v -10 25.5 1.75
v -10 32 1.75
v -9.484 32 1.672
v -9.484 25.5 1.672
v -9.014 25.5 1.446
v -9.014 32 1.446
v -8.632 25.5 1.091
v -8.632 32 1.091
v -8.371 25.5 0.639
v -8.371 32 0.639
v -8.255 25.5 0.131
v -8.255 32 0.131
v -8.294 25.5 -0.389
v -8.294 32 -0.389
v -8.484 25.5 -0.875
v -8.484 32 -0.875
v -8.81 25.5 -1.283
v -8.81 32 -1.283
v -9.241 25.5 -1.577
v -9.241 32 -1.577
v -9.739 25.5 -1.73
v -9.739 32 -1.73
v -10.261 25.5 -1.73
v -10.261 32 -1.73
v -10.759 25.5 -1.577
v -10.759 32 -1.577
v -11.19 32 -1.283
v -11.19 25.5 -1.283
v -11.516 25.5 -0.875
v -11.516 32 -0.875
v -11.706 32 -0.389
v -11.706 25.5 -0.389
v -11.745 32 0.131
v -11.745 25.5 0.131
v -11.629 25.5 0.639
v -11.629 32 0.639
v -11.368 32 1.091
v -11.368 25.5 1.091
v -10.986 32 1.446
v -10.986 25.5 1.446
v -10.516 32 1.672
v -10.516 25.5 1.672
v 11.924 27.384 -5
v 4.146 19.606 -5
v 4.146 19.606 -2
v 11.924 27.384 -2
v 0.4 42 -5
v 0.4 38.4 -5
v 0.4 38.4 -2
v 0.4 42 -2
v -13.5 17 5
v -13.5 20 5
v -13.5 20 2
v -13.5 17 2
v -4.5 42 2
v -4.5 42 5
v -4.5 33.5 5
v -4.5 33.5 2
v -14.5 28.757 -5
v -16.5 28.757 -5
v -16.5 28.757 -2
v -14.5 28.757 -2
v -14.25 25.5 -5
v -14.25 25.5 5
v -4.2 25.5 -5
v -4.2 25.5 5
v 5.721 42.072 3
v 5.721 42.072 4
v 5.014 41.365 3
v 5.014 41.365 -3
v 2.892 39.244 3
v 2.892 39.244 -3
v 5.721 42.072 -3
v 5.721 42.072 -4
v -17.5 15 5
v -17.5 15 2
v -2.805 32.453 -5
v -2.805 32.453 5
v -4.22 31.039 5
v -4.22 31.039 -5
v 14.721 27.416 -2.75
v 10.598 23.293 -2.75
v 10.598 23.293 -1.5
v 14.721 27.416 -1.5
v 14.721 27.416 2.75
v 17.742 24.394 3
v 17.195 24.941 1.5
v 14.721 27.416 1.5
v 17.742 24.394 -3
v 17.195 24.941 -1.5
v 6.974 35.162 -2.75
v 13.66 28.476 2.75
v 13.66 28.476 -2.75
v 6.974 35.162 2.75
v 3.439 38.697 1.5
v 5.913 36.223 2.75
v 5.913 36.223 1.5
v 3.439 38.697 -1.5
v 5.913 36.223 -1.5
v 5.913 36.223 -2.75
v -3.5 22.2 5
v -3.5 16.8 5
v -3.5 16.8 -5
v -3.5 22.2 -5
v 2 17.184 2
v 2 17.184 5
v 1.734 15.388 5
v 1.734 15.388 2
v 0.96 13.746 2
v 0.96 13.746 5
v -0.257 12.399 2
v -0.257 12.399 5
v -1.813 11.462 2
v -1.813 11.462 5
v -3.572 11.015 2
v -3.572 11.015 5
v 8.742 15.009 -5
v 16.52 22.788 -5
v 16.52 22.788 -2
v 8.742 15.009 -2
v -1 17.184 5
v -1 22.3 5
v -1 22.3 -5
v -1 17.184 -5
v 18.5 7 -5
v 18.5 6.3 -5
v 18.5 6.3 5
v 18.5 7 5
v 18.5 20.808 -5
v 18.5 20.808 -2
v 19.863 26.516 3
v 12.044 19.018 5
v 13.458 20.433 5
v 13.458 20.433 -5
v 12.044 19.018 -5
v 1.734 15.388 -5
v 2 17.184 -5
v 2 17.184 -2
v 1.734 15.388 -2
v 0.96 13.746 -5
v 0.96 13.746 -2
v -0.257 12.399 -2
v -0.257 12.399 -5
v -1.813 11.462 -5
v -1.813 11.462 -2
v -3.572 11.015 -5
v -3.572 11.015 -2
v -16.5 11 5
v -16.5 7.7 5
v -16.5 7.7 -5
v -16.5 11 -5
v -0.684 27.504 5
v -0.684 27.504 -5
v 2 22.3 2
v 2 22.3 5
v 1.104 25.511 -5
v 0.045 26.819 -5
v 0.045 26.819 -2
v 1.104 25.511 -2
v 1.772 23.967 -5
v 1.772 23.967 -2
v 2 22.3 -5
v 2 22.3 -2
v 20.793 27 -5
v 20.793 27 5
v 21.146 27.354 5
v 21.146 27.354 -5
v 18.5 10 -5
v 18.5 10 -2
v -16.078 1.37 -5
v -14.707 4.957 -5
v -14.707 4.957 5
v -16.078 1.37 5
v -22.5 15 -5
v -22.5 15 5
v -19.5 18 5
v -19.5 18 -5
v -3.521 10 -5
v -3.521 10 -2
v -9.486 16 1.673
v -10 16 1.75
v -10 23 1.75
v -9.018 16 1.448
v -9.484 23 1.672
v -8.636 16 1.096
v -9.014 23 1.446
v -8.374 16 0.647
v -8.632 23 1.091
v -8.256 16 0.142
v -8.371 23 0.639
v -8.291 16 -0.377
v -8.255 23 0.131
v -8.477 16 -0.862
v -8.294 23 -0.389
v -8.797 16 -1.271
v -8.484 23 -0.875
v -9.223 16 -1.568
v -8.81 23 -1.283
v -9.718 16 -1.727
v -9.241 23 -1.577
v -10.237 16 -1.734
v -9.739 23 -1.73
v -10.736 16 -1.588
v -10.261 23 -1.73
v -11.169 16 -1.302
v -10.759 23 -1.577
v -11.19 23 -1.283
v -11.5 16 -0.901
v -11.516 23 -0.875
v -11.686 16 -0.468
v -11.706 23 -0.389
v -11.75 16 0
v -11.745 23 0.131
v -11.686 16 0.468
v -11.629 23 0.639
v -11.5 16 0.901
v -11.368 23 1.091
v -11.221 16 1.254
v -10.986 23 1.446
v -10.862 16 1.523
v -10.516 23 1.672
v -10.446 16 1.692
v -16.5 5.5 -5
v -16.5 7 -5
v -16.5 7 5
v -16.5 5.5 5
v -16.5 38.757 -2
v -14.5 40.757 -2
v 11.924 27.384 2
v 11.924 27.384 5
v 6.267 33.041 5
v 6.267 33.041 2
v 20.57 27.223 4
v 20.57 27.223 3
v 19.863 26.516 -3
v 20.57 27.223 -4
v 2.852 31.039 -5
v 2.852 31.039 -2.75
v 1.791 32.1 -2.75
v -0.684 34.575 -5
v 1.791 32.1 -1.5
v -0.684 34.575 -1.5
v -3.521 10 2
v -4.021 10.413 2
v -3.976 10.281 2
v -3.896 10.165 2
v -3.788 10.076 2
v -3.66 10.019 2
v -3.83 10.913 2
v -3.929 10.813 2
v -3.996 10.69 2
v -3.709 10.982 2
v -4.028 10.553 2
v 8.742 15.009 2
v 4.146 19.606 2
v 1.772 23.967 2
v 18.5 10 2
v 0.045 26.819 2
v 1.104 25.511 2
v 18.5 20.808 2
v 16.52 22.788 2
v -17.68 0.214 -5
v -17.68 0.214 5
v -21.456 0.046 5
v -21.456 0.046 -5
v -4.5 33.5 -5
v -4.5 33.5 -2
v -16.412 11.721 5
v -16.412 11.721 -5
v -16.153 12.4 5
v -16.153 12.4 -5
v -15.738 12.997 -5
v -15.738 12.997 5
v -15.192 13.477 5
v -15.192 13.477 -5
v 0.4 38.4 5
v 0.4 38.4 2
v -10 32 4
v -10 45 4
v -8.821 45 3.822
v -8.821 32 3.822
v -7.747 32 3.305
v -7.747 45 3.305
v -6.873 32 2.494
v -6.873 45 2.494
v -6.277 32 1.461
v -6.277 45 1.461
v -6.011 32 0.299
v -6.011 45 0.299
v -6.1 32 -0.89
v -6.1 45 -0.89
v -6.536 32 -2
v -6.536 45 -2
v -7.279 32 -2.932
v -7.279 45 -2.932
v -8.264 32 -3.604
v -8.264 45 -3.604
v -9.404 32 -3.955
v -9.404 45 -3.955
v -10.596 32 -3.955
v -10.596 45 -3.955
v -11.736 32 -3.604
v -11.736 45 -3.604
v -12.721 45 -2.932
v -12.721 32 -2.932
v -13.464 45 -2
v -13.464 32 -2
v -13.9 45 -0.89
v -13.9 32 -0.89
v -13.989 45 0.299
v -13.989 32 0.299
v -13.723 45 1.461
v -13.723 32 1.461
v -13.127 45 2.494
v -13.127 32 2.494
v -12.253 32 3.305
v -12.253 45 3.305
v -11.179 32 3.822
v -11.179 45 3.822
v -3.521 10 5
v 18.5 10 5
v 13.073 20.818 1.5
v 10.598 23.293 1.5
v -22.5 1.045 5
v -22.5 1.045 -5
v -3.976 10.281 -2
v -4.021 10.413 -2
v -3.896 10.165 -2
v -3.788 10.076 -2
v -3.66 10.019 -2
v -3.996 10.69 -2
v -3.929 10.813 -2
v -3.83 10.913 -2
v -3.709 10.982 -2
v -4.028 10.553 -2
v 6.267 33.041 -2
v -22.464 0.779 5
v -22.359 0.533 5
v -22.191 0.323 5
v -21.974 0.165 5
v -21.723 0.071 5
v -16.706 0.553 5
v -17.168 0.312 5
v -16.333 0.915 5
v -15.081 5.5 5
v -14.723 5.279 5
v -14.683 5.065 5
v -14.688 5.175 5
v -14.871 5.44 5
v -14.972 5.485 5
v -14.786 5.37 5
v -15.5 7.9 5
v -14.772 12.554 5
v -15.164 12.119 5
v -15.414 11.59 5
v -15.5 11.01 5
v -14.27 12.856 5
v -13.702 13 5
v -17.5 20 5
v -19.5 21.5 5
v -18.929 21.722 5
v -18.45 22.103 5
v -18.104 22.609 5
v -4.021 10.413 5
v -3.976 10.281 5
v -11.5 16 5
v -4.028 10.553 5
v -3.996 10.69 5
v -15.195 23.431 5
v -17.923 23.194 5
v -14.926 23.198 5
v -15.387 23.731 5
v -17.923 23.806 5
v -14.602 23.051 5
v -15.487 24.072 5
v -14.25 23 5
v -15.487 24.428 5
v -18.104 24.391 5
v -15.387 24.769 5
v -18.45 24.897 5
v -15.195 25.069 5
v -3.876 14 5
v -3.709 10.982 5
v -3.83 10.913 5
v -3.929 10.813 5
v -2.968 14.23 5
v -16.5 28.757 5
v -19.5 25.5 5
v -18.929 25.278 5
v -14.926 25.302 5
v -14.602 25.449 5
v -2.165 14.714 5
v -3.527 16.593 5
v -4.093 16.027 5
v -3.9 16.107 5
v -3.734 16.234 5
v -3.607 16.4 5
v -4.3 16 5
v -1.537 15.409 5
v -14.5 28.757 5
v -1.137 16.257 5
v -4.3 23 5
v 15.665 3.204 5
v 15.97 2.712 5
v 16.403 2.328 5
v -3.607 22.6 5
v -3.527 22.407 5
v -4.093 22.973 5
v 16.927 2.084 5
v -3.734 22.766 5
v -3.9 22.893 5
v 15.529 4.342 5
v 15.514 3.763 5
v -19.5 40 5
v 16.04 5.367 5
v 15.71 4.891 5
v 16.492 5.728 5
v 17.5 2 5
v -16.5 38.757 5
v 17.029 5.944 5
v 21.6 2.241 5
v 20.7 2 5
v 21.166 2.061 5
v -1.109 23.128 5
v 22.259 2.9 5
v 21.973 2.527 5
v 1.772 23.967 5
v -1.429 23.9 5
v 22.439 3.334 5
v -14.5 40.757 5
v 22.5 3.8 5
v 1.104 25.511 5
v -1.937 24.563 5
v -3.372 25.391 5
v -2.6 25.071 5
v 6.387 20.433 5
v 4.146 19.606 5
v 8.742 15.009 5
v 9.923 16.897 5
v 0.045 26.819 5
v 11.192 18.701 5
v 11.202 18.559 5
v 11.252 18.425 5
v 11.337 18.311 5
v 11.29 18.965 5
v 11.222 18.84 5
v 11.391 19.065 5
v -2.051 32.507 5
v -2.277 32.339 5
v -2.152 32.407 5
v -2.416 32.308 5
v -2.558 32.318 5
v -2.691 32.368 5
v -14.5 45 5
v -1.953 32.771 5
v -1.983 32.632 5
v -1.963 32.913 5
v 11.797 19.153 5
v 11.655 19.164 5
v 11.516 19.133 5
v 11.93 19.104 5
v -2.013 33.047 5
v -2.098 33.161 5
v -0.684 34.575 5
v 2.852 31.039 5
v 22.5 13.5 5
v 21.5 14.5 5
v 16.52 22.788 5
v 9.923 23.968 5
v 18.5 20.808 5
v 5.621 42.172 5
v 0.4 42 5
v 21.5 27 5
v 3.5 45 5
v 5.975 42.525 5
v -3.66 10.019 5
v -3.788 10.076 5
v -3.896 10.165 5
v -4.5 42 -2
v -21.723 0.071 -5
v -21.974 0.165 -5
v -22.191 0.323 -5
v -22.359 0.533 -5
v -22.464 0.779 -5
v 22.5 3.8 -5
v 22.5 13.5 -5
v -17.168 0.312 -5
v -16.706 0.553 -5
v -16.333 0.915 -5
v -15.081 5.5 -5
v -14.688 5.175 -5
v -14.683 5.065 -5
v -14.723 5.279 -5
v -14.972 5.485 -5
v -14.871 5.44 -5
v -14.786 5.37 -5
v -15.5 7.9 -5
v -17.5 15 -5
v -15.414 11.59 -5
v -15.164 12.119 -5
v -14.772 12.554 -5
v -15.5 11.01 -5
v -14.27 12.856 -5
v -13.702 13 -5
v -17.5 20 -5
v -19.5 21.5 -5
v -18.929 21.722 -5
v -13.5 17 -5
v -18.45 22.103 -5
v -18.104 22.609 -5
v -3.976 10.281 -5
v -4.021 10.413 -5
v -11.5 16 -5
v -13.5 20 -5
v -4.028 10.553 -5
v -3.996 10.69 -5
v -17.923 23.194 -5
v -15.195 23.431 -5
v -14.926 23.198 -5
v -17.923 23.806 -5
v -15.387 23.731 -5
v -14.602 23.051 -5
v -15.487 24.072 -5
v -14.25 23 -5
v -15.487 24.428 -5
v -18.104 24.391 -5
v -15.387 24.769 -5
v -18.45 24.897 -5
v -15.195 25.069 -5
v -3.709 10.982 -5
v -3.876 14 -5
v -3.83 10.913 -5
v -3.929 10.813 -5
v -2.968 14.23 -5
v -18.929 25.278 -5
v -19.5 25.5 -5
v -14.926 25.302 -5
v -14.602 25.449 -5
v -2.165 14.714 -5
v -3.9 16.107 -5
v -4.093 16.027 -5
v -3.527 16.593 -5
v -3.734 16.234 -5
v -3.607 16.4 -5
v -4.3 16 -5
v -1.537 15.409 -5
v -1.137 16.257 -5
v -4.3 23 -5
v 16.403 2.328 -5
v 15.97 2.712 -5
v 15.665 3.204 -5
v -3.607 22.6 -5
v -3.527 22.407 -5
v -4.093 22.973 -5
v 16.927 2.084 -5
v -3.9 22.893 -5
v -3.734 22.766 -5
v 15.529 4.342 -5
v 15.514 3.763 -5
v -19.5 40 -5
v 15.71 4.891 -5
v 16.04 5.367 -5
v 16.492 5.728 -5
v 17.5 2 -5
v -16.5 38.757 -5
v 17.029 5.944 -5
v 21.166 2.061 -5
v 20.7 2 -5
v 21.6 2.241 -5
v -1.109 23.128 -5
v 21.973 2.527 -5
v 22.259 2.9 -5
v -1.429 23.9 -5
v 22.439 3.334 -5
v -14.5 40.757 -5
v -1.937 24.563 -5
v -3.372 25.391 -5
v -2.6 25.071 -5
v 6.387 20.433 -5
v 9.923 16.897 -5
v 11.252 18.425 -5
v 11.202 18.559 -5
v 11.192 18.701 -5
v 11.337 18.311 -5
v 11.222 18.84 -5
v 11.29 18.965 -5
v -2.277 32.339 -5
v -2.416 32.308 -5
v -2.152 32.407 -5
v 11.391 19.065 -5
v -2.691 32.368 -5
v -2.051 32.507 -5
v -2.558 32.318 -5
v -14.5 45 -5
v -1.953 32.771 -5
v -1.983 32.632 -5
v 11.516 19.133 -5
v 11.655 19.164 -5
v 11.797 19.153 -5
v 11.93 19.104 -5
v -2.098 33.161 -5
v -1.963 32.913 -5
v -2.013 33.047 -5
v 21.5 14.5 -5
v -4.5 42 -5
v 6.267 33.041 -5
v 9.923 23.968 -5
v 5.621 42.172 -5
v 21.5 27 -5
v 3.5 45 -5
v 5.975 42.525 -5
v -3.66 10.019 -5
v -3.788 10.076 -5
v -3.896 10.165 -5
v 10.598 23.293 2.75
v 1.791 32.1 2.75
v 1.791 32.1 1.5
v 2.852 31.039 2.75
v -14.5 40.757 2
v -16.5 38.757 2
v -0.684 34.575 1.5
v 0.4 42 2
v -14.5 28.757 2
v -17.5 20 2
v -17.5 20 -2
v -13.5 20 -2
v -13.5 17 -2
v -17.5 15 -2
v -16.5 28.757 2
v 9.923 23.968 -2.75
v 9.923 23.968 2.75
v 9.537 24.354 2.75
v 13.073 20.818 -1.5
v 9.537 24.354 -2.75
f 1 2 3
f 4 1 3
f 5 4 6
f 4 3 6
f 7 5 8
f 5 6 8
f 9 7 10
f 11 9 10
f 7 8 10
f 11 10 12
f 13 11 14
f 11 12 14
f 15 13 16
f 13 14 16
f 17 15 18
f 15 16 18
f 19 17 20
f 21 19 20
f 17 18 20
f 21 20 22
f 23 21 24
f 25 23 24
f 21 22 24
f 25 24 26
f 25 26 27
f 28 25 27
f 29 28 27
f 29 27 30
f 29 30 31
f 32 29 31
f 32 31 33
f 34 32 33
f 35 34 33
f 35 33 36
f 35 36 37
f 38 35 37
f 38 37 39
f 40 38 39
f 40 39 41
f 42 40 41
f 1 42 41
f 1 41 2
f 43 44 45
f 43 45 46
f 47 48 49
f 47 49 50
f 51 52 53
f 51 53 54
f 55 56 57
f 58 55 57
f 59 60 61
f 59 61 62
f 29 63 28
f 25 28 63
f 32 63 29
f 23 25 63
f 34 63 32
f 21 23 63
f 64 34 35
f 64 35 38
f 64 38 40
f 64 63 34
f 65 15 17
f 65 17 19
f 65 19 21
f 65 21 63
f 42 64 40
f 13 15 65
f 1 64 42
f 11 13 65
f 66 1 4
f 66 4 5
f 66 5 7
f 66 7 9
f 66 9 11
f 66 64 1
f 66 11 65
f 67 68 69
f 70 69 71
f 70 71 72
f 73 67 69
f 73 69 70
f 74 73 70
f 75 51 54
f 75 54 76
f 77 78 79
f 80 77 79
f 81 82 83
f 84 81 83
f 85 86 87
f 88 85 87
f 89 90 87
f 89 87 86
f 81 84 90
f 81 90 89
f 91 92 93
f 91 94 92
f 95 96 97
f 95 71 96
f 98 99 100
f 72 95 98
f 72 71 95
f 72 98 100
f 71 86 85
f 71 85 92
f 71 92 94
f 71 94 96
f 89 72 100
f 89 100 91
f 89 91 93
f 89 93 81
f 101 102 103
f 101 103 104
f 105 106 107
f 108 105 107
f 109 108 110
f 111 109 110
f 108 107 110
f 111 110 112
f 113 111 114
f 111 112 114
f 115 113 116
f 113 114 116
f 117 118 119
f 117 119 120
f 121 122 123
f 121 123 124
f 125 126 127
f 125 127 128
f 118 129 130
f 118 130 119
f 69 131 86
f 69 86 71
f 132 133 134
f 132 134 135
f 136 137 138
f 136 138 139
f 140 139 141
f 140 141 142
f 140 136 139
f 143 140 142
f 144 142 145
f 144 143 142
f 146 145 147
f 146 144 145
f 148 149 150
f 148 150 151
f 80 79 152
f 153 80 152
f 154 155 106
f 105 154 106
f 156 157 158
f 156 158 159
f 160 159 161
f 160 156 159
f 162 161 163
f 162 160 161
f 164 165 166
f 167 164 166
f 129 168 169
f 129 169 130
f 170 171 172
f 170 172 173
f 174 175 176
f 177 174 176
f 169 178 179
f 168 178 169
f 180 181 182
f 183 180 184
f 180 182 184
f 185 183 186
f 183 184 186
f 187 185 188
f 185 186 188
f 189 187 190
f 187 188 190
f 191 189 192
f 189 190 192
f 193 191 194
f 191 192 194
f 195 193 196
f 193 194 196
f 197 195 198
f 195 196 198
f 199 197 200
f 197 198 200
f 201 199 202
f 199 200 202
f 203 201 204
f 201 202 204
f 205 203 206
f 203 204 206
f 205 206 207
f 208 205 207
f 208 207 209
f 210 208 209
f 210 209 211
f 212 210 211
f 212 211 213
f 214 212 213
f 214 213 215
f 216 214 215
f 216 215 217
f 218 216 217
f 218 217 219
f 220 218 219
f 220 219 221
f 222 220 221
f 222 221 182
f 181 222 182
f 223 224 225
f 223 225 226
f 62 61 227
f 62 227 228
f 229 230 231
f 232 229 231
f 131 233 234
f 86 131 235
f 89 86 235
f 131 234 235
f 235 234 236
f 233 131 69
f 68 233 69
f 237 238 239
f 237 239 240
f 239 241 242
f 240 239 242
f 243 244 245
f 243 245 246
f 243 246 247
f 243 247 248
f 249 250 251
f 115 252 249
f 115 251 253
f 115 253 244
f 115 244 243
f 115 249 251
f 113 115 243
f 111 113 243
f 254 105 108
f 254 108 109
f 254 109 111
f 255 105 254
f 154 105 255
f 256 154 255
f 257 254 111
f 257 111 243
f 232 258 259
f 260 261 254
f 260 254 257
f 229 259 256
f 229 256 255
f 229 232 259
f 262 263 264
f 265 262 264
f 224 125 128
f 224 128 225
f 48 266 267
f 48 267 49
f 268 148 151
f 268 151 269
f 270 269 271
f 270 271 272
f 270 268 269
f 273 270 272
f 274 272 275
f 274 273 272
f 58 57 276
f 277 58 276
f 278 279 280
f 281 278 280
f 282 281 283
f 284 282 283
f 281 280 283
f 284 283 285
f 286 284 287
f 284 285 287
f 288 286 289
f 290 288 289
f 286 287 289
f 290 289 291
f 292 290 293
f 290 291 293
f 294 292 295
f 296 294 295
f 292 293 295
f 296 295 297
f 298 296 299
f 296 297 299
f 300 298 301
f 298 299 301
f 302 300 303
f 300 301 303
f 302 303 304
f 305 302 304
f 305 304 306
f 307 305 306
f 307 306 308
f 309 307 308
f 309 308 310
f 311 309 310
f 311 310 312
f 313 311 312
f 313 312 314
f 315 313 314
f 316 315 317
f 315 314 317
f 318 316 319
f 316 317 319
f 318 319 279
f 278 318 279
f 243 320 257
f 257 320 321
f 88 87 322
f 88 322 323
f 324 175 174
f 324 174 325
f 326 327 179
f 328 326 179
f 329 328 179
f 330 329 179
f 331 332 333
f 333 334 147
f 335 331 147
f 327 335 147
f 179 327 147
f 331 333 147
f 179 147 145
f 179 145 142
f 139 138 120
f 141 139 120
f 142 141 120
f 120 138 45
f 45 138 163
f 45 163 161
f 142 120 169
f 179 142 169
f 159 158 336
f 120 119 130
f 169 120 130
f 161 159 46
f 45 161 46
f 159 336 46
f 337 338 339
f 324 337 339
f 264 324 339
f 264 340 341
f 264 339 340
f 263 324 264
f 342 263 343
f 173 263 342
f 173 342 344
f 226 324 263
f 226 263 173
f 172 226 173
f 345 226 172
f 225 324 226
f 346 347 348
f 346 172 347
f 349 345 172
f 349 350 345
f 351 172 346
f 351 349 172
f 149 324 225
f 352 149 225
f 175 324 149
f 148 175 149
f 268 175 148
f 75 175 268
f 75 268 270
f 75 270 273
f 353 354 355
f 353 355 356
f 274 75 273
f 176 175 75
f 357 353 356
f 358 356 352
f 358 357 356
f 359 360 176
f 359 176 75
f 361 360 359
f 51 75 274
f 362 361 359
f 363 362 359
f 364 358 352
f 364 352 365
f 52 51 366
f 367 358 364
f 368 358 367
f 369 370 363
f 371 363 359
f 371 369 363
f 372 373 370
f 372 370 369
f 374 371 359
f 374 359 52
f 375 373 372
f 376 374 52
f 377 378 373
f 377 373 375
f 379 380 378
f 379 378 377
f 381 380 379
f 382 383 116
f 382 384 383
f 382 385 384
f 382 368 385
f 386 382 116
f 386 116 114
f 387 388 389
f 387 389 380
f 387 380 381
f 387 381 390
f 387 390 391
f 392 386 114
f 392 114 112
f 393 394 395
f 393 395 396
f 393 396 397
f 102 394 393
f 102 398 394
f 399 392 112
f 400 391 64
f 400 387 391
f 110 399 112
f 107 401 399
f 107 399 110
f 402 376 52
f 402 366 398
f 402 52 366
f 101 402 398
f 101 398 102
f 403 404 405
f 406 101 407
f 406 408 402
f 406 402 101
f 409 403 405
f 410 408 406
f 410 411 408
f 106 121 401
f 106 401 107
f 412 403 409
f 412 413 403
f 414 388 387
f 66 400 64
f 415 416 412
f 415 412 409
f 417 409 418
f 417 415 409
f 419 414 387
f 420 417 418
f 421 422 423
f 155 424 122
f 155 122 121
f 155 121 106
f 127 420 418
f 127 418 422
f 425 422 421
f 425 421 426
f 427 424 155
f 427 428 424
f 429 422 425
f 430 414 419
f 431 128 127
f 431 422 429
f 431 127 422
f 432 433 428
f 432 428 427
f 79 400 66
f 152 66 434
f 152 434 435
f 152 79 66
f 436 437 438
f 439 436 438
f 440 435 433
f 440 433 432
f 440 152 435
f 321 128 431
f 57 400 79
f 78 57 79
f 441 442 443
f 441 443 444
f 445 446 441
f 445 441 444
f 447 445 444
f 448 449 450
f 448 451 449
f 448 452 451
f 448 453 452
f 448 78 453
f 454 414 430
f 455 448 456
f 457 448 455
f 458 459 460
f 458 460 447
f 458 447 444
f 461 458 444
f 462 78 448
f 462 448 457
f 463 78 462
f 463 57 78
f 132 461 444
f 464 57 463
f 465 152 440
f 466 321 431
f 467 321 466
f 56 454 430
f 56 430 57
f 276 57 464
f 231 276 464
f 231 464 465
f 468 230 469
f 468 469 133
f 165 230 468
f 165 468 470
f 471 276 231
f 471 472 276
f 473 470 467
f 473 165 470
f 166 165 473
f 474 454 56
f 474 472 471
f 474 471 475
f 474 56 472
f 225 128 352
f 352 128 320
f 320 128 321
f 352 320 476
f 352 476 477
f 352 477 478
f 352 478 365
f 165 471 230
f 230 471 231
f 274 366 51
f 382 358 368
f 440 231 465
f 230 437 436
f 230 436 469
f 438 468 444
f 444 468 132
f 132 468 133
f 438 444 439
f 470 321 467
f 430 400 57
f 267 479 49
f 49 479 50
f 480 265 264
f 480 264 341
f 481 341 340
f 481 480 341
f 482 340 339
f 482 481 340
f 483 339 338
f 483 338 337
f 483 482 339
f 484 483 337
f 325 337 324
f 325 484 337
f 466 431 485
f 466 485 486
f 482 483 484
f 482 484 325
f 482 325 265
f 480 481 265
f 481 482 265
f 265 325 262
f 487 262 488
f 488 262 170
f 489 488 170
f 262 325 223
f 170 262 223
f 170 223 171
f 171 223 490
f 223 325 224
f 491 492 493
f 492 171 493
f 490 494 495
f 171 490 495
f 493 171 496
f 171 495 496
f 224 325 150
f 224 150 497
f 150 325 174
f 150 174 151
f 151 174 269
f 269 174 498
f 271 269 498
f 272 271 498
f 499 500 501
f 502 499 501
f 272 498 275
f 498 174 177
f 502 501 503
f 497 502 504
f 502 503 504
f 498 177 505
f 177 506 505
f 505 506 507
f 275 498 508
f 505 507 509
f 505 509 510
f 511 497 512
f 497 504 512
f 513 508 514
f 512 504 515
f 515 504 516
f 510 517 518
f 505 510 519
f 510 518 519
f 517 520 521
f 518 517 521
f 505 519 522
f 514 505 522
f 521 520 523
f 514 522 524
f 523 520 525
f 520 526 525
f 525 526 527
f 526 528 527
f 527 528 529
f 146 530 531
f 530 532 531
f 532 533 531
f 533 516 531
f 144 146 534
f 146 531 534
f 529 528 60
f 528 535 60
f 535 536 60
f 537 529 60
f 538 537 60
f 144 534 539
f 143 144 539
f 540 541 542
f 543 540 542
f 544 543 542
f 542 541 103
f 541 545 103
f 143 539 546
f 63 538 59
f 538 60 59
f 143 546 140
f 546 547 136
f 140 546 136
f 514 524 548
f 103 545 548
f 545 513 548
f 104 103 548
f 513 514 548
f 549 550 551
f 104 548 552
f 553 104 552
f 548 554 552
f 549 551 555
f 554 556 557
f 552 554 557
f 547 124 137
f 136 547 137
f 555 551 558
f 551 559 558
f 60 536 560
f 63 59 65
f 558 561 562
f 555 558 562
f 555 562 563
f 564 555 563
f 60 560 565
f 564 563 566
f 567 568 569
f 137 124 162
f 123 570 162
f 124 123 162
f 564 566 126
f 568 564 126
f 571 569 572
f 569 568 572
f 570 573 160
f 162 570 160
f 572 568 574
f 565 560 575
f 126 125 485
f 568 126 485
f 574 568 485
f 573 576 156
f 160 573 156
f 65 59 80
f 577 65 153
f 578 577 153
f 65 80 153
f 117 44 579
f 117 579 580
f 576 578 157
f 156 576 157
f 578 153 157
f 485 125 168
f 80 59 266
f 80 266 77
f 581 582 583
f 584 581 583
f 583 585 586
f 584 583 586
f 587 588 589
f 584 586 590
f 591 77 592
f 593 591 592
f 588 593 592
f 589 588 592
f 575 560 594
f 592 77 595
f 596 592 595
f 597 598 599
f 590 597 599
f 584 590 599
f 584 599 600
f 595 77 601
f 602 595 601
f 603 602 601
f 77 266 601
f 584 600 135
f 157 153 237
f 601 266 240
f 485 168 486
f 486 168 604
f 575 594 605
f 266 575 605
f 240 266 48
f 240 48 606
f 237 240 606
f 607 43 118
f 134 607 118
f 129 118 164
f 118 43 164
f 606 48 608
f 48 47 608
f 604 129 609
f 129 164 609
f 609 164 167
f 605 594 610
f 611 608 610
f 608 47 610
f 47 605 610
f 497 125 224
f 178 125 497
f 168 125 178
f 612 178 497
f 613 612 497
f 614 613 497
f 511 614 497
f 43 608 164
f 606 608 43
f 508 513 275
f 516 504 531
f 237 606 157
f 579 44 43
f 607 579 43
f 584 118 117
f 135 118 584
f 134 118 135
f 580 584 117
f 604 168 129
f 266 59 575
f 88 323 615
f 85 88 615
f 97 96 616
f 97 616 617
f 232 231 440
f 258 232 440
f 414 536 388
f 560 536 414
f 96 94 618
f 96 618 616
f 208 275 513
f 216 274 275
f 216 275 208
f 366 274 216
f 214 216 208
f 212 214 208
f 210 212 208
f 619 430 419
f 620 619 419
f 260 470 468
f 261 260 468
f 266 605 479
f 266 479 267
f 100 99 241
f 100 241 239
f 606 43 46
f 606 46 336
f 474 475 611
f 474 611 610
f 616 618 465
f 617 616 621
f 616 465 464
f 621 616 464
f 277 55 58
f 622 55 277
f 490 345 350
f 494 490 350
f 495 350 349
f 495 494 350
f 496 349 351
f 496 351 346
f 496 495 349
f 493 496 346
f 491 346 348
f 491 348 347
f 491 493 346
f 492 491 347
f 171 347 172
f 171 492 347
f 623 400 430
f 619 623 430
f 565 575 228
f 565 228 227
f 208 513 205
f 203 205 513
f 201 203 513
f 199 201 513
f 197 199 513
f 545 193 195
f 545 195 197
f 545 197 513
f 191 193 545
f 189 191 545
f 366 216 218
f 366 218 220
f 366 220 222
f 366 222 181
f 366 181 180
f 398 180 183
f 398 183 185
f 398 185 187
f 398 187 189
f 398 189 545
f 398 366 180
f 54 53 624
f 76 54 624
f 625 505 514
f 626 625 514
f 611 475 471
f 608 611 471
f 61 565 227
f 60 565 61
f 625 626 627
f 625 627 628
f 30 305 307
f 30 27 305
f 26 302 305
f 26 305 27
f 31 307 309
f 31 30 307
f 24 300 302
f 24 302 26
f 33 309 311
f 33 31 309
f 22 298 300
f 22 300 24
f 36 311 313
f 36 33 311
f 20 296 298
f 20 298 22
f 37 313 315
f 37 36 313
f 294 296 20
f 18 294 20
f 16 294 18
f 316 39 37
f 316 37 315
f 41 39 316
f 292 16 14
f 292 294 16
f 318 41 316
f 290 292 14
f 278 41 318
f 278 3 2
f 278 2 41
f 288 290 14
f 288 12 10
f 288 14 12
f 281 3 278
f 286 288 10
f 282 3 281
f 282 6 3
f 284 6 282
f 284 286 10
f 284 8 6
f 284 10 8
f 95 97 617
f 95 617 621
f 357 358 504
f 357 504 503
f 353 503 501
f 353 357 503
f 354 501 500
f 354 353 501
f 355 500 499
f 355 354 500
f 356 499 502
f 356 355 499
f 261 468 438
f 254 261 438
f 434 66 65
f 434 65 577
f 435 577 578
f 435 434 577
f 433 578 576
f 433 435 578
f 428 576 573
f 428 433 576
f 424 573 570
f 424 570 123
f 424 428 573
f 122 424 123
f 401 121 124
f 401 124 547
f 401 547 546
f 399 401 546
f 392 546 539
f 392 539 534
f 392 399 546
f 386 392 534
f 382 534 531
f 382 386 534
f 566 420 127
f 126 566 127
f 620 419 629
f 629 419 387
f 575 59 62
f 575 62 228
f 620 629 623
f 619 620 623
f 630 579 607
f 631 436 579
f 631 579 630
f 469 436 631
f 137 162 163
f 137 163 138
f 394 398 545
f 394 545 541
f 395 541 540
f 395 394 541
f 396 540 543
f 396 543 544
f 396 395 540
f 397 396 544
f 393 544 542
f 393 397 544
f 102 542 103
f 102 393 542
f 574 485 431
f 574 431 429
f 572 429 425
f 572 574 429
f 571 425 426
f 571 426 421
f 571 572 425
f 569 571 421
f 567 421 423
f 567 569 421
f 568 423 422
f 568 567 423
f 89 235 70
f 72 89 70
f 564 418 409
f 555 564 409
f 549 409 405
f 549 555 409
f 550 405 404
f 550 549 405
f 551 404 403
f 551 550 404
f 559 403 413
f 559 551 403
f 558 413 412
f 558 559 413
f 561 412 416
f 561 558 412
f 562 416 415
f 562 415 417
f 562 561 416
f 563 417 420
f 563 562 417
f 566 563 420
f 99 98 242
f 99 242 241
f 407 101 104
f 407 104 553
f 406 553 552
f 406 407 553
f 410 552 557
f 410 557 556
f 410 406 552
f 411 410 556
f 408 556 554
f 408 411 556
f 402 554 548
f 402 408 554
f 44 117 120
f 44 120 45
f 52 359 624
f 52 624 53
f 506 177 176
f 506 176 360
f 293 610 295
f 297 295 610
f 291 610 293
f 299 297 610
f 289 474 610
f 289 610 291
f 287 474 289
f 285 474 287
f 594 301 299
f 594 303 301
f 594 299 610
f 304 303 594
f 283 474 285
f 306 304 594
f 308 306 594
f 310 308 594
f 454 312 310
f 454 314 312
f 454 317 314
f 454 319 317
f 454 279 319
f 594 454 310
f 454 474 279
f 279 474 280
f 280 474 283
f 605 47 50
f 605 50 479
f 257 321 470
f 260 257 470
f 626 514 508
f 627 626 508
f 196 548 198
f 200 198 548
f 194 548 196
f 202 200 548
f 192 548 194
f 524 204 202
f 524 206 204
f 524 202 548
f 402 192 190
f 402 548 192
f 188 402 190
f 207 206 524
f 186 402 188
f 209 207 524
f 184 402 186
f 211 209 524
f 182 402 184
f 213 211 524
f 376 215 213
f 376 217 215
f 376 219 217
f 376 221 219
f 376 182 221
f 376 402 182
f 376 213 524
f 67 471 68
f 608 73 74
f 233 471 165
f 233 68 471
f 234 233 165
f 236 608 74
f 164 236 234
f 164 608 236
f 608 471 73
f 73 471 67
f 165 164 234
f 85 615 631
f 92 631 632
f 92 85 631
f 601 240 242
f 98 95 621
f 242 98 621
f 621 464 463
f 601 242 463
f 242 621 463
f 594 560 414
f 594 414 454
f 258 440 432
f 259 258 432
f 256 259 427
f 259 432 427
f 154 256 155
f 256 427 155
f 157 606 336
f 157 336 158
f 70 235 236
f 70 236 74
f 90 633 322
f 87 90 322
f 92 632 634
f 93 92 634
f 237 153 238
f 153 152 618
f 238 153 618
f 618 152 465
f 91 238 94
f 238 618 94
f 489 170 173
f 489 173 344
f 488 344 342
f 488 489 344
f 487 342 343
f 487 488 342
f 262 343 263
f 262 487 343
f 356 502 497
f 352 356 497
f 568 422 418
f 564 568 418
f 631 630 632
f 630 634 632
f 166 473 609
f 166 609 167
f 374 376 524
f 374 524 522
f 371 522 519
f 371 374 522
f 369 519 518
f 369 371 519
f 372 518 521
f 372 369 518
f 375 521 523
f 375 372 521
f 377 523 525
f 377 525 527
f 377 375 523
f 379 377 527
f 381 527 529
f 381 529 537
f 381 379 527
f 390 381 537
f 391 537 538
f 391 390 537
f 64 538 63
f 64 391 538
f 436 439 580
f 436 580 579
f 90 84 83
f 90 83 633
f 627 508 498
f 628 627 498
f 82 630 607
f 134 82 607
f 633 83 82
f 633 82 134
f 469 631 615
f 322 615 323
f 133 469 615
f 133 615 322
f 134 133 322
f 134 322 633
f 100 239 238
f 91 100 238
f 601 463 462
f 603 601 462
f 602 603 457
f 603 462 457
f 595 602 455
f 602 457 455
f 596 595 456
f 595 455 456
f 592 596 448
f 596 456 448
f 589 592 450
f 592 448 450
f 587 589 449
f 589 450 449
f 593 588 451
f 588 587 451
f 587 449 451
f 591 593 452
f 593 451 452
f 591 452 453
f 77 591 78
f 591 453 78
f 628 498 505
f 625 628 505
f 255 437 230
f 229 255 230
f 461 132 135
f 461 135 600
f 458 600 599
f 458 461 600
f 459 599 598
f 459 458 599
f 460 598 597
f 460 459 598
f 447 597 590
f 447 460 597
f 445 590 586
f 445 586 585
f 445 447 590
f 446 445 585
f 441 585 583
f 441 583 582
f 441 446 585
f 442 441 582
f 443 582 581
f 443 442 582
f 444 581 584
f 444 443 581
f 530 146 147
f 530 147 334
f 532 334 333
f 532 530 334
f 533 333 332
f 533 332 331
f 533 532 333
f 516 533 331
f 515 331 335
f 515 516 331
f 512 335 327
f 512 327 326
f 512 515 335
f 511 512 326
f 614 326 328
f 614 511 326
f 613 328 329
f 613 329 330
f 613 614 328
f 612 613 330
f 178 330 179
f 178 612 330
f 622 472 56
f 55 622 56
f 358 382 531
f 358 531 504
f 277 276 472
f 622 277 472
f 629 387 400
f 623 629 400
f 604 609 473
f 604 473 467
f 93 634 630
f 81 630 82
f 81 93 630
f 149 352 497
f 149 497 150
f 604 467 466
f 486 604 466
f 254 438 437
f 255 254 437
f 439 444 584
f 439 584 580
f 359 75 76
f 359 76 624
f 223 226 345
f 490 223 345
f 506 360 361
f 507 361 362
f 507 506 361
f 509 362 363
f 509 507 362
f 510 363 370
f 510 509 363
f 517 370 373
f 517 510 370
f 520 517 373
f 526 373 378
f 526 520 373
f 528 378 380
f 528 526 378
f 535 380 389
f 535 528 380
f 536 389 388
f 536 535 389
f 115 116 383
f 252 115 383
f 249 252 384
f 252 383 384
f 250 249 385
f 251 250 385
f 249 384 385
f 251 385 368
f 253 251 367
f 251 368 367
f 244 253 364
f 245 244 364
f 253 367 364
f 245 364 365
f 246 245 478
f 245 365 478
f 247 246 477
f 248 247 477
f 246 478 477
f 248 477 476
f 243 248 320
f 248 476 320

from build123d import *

# Parameters (mm, degrees)
BOSS_EXTRUDE1_DEPTH     = 5
CUT_EXTRUDE1_DEPTH      = 52.295711322
CUT_EXTRUDE1_DEPTH_BACK = 10
CUT_EXTRUDE3_START      = -10
CUT_EXTRUDE3_DEPTH      = 10
CUT_EXTRUDE4_DEPTH      = 52.295711322
CUT_EXTRUDE4_DEPTH_BACK = 10
CUT_EXTRUDE5_DEPTH      = 10
CUT_EXTRUDE6_DEPTH      = 3
SKETCH9_R               = 4
CUT_EXTRUDE7_DEPTH      = 13
CUT_EXTRUDE8_REACH      = 41.4
SKETCH10_R              = 1.75
CUT_EXTRUDE9_DEPTH      = 13
SKETCH12_W              = 6
SKETCH12_H              = 21
CUT_EXTRUDE10_DEPTH     = 4
CUT_EXTRUDE11_DEPTH     = 5.830271703
CHAMFER1_SIZE           = 1


# Read off the part's stored shape, not the designer's step: Cut-Extrude3
with BuildPart() as part:
    # Sketch1 → Boss-Extrude1 (new, symmetric)
    with BuildSketch(Plane.XY):
        Polygon((-22.5, 45), (-22.5, 0), (22.5, 0), (22.5, 26), (3.5, 45), align=None)
    extrude(amount=BOSS_EXTRUDE1_DEPTH, both=True)

    # Sketch2 → Cut-Extrude1 (cut, two sides: drawn at the far end of the back side and taken through both)
    with BuildSketch(Plane.XY.offset(5).offset(-CUT_EXTRUDE1_DEPTH_BACK)):
        with BuildLine():
            Line((-111.960387508, -74.460387508), (-22.5, 15))
            Line((-22.5, 15), (-19.5, 18))
            Line((-19.5, 18), (-19.5, 21.5))
            ThreePointArc((-19.5, 21.5), (-17.9, 23.5), (-19.5, 25.5))
            Line((-19.5, 25.5), (-19.5, 40))
            Line((-19.5, 40), (-14.5, 45))
            Line((-14.5, 45), (74.960387508, 134.460387508))
            Line((74.960387508, 134.460387508), (-113.613392046, 303.176768247))
            Line((-113.613392046, 303.176768247), (-300.534167062, 94.255993231))
            Line((-300.534167062, 94.255993231), (-111.960387508, -74.460387508))
        make_face()
    extrude(amount=CUT_EXTRUDE1_DEPTH + CUT_EXTRUDE1_DEPTH_BACK, mode=Mode.SUBTRACT)

    # Cut-Extrude3 outline → Cut-Extrude3 (cut)
    with BuildSketch(Plane.XY.offset(5).offset(CUT_EXTRUDE3_START)):
        Polygon((21.5, 27), (21.5, 14.5), (22.5, 13.5), (22.5, 26), align=None)
        with BuildLine():
            Line((22.5, 0), (22.5, 3.8))
            ThreePointArc((22.5, 3.8), (21.972792206, 2.527207794), (20.7, 2))
            Line((20.7, 2), (17.5, 2))
            ThreePointArc((17.5, 2), (15.514097811, 3.762950432), (17.029242744, 5.943807502))
            Line((17.029242744, 5.943807502), (18.5, 6.3))
            Line((18.5, 6.3), (18.5, 7))
            Line((18.5, 7), (-16.5, 7))
            Line((-16.5, 7), (-16.5, 5.5))
            Line((-16.5, 5.5), (-15.081081244, 5.5))
            ThreePointArc((-15.081081244, 5.5), (-14.751598645, 5.326806563), (-14.707437165, 4.957206084))
            Line((-14.707437165, 4.957206084), (-16.078389668, 1.369880369))
            ThreePointArc((-16.078389668, 1.369880369), (-16.706486271, 0.552810765), (-17.679866918, 0.214228137))
            Line((-17.679866918, 0.214228137), (-21.455599386, 0.046417805))
            ThreePointArc((-21.455599386, 0.046417805), (-22.191230564, 0.322797329), (-22.5, 1.045431612))
            Line((-22.5, 1.045431612), (-22.5, 0))
            Line((-22.5, 0), (22.5, 0))
        make_face()
    extrude(amount=CUT_EXTRUDE3_DEPTH, mode=Mode.SUBTRACT)

    # Sketch3 → Cut-Extrude4 (cut, two sides: drawn at the far end of the back side and taken through both)
    with BuildSketch(Plane.XY.offset(5).offset(-CUT_EXTRUDE4_DEPTH_BACK)):
        Polygon((85.857284299, 122.40753683), (5.974873734, 42.525126266), (5.621320344, 42.171572875), (20.792893219, 27), (21.146446609, 27.353553391), (101.028857174, 107.235963955), (260.793678303, 267.000785084), (245.622105428, 282.17235796), align=None)
    extrude(amount=CUT_EXTRUDE4_DEPTH + CUT_EXTRUDE4_DEPTH_BACK, mode=Mode.SUBTRACT)

    # Sketch7 → Cut-Extrude5 (cut)
    with BuildSketch(Plane.XY.offset(5)):
        with BuildLine():
            Line((-16.5, 7.7), (-16.5, 11))
            ThreePointArc((-16.5, 11), (-16.153059775, 12.400454865), (-15.192484115, 13.476993646))
            Line((-15.192484115, 13.476993646), (-11.5, 16))
            Line((-11.5, 16), (-4.3, 16))
            ThreePointArc((-4.3, 16), (-3.734314575, 16.234314575), (-3.5, 16.8))
            Line((-3.5, 16.8), (-3.5, 22.2))
            ThreePointArc((-3.5, 22.2), (-3.734314575, 22.765685425), (-4.3, 23))
            Line((-4.3, 23), (-14.25, 23))
            ThreePointArc((-14.25, 23), (-15.5, 24.25), (-14.25, 25.5))
            Line((-14.25, 25.5), (-4.2, 25.5))
            ThreePointArc((-4.2, 25.5), (-1.9372583, 24.5627417), (-1, 22.3))
            Line((-1, 22.3), (-1, 17.183557492))
            ThreePointArc((-1, 17.183557492), (-1.825475903, 15.038415232), (-3.876022072, 14))
            Line((-3.876022072, 14), (-13.702486205, 13))
            ThreePointArc((-13.702486205, 13), (-14.98407756, 12.35099048), (-15.5, 11.010276568))
            Line((-15.5, 11.010276568), (-15.5, 7.9))
            Line((-15.5, 7.9), (-16.5, 7.7))
        make_face()
    extrude(amount=-CUT_EXTRUDE5_DEPTH, mode=Mode.SUBTRACT)

    # Sketch8 → Cut-Extrude6 (cut)
    with BuildSketch(Plane.XY.offset(5)):
        Polygon((-17.5, 20), (-13.5, 20), (-13.5, 17), (-17.5, 15), align=None)
        Polygon((-16.5, 38.757359313), (-16.5, 28.757359313), (-14.5, 28.757359313), (-14.5, 40.757359313), align=None)
        Polygon((0.4, 42), (-4.5, 42), (-4.5, 33.5), (0.4, 38.4), align=None)
        with BuildLine():
            Line((-3.52075849, 10), (18.5, 10))
            Line((18.5, 10), (18.5, 20.807611845))
            Line((18.5, 20.807611845), (16.520101013, 22.787510832))
            Line((16.520101013, 22.787510832), (8.74192642, 15.009336239))
            Line((8.74192642, 15.009336239), (4.145732342, 19.605530317))
            Line((4.145732342, 19.605530317), (11.923906935, 27.38370491))
            Line((11.923906935, 27.38370491), (6.267052685, 33.040559159))
            Line((6.267052685, 33.040559159), (0.045175397, 26.818681871))
            ThreePointArc((0.045175397, 26.818681871), (1.490346539, 24.761697843), (2, 22.3))
            Line((2, 22.3), (2, 17.183557492))
            ThreePointArc((2, 17.183557492), (0.400640437, 13.027344363), (-3.572292764, 11.015414852))
            ThreePointArc((-3.572292764, 11.015414852), (-4.029119362, 10.483214857), (-3.52075849, 10))
        make_face()
    cut_extrude6 = extrude(amount=-CUT_EXTRUDE6_DEPTH, mode=Mode.SUBTRACT)

    # Mirror1: Cut-Extrude6 across plane
    add(cut_extrude6.mirror(Plane.XY), mode=Mode.SUBTRACT)

    # Sketch9 → Cut-Extrude7 (cut)
    with BuildSketch(Plane(origin=(0, 45, 0), x_dir=(1, 0, 0), z_dir=(0, 1, 0))):
        with Locations(Location((-10, 0, 0), (0, 0, 270))):
            Circle(SKETCH9_R)
    extrude(amount=-CUT_EXTRUDE7_DEPTH, mode=Mode.SUBTRACT)

    # Cut-Extrude8: up to this face of the body (flat: up to its plane)
    cut_extrude8_end = Plane(part.part.faces().sort_by_distance((-7.9, 16, 0))[0])
    # Sketch10 → Cut-Extrude8 (cut, up to the picked face)
    with BuildSketch(Plane(origin=(0, 32, 0), x_dir=(1, 0, 0), z_dir=(0, 1, 0)), mode=Mode.PRIVATE) as cut_extrude8_sk1:
        with Locations(Location((-10, 0, 0), (0, 0, 270))):
            Circle(SKETCH10_R)
    cut_extrude8_tool1 = split(extrude(cut_extrude8_sk1.sketch, amount=-CUT_EXTRUDE8_REACH, mode=Mode.PRIVATE), bisect_by=cut_extrude8_end, keep=Keep.BOTH, mode=Mode.PRIVATE)
    add(cut_extrude8_tool1.solids().sort_by(Axis((-10, 32, 0), (0, -1, 0)))[0], mode=Mode.SUBTRACT)

    # Sketch11 → Cut-Extrude9 (cut)
    with BuildSketch(Plane.XY.offset(5)):
        with BuildLine():
            Line((-4.219533003, 31.039254845), (-0.683999097, 27.503720939))
            Line((-0.683999097, 27.503720939), (2.851534809, 31.039254845))
            Line((2.851534809, 31.039254845), (-0.683999097, 34.574788751))
            Line((-0.683999097, 34.574788751), (-2.098212659, 33.160575189))
            ThreePointArc((-2.098212659, 33.160575189), (-2.098212659, 32.453468408), (-2.80531944, 32.453468408))
            Line((-2.80531944, 32.453468408), (-4.219533003, 31.039254845))
        make_face()
        with BuildLine():
            Line((11.336816184, 18.311332784), (9.922602621, 16.897119222))
            Line((9.922602621, 16.897119222), (6.387068715, 20.432653128))
            Line((6.387068715, 20.432653128), (9.922602621, 23.968187033))
            Line((9.922602621, 23.968187033), (13.458136527, 20.432653128))
            Line((13.458136527, 20.432653128), (12.043922965, 19.018439565))
            ThreePointArc((12.043922965, 19.018439565), (11.336816184, 19.018439565), (11.336816184, 18.311332784))
        make_face()
    extrude(amount=-CUT_EXTRUDE9_DEPTH, mode=Mode.SUBTRACT)

    # Sketch12 → Cut-Extrude10 (cut)
    with BuildSketch(Plane(origin=(23.896446609, 23.896446609, 0), x_dir=(0, 0, -1), z_dir=(0.7071067811865471, 0.7071067811865479, 0))):
        with Locations((0, 15.204222165)):
            Rectangle(SKETCH12_W, SKETCH12_H)
    extrude(amount=-CUT_EXTRUDE10_DEPTH, mode=Mode.SUBTRACT)

    # Sketch13 → Cut-Extrude11 (cut)
    with BuildSketch(Plane(origin=(21.068019485, 21.068019485, 0), x_dir=(0, 0, -1), z_dir=(0.7071067811865471, 0.7071067811865479, 0))):
        Polygon((-1.5, 24.931727984), (1.5, 24.931727984), (1.5, 21.431727984), (2.75, 21.431727984), (2.75, 19.931727984), (-2.75, 19.931727984), (-2.75, 21.431727984), (-1.5, 21.431727984), align=None)
        Polygon((-1.5, 5.476716347), (-1.5, 8.976716347), (-2.75, 8.976716347), (-2.75, 10.476716347), (2.75, 10.476716347), (2.75, 8.976716347), (1.5, 8.976716347), (1.5, 5.476716347), align=None)
    extrude(amount=-CUT_EXTRUDE11_DEPTH, mode=Mode.SUBTRACT)

    # Chamfer1
    chamfer1_edges = [part.edges().sort_by_distance(p)[0] for p in [
        (13.145438014, 34.647455205, -3),
        (13.145438014, 34.647455205, 3),
    ]]
    chamfer(chamfer1_edges, length=CHAMFER1_SIZE)


solid = part.part
